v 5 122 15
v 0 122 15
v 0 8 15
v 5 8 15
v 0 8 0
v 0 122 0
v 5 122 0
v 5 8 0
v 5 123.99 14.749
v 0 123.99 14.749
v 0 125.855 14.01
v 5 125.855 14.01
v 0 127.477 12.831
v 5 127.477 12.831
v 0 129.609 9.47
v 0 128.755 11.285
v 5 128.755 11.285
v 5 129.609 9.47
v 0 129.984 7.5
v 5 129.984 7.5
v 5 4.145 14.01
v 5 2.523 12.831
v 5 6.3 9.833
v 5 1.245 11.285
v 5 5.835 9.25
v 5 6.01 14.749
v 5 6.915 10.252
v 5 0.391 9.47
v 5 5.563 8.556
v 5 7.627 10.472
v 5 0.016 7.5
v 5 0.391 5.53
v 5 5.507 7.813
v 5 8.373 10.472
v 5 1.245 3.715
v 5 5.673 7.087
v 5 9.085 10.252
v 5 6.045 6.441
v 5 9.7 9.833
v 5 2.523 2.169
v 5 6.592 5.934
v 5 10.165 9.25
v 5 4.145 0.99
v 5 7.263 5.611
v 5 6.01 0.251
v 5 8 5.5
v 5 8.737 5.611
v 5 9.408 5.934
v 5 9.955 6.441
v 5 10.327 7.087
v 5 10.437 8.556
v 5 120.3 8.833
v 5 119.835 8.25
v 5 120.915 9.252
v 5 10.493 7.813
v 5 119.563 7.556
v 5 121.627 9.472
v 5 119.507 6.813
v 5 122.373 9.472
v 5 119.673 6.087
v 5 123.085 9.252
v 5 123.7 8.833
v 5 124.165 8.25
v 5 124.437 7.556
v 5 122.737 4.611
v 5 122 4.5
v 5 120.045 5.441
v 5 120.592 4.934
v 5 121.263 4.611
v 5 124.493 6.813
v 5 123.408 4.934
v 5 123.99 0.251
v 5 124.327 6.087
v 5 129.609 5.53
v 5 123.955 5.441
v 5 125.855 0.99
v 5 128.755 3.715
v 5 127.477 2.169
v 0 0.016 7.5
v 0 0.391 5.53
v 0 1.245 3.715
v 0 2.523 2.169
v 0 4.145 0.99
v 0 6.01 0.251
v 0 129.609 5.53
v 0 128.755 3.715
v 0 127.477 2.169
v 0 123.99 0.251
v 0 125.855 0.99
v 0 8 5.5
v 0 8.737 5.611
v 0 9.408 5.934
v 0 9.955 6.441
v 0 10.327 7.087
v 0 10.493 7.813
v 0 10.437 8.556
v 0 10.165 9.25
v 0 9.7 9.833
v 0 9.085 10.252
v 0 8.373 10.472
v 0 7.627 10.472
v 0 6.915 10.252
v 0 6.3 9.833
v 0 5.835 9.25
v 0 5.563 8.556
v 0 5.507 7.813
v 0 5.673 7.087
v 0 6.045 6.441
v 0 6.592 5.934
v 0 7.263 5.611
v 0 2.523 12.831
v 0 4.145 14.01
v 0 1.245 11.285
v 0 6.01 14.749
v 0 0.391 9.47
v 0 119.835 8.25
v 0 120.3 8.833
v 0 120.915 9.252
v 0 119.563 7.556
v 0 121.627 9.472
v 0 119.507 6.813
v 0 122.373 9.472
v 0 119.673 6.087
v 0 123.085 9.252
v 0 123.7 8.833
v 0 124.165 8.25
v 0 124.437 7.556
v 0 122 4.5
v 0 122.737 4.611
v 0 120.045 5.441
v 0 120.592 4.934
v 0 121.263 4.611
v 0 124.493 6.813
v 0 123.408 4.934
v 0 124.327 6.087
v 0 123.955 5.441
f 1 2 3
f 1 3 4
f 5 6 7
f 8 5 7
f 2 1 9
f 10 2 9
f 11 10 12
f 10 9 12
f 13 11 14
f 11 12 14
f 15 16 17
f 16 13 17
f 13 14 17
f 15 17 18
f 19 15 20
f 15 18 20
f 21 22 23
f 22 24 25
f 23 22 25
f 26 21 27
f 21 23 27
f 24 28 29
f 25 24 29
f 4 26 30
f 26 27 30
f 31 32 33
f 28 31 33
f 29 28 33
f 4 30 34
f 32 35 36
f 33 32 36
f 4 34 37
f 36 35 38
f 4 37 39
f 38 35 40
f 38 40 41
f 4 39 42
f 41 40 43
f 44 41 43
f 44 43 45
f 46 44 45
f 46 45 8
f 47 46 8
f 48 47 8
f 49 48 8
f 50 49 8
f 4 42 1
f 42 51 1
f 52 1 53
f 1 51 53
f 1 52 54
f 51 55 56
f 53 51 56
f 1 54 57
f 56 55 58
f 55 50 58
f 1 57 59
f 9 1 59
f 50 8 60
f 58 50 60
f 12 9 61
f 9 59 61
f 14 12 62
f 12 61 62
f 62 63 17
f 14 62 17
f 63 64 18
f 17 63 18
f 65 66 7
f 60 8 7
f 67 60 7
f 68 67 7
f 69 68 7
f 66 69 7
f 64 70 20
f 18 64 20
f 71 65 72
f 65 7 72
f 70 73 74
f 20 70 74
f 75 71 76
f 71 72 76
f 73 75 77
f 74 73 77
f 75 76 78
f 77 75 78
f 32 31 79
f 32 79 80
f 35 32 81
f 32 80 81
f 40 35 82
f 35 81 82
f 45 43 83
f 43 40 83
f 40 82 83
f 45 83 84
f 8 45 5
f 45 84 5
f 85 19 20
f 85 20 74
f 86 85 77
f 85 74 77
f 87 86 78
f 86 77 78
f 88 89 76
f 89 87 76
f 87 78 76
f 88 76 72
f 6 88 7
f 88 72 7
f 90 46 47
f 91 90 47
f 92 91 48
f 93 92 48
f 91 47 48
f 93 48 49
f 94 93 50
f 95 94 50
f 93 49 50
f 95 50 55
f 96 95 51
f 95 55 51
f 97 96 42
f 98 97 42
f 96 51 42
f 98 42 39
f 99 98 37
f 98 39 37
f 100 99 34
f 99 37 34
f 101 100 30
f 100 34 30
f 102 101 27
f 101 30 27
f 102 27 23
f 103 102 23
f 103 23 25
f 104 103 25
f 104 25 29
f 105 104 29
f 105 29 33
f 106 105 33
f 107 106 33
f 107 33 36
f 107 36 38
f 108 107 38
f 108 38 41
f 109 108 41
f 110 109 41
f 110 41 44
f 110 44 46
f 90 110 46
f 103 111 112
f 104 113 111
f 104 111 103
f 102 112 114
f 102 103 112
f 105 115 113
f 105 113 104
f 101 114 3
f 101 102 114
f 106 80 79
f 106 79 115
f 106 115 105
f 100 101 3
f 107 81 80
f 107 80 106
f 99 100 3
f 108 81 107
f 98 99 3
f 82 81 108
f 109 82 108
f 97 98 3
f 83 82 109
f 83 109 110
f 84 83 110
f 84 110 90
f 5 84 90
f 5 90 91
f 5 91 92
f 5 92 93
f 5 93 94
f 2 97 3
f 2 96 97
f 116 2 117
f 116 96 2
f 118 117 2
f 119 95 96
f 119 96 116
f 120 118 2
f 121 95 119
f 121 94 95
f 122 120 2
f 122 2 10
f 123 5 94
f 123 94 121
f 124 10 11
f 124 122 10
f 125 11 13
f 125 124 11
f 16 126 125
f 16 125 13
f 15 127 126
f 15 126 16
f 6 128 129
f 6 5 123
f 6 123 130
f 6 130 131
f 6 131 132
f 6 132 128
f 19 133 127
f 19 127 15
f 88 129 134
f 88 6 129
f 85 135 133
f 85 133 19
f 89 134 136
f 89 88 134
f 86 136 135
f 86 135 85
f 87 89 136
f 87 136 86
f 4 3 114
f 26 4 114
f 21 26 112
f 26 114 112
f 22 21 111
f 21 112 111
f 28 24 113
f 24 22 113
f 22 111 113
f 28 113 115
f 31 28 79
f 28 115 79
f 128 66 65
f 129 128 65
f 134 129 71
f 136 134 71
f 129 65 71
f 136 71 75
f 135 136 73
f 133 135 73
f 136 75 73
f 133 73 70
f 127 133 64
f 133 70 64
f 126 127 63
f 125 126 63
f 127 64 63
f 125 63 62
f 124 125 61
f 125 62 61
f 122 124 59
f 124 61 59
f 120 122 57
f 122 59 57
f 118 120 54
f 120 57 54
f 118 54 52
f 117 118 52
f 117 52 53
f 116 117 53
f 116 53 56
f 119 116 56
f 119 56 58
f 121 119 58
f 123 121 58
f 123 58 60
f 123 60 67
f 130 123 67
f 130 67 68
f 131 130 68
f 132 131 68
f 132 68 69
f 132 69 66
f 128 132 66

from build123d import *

# Parameters (mm, degrees)
ESQUISSE1_W             = 5
ESQUISSE1_H             = 130
BOSS_EXTRU_1_DEPTH      = 15
CONG_1_R                = 8
ESQUISSE2_R             = 2.5
ENL_V_MAT_EXTRU_1_DEPTH = 15


with BuildPart() as part:
    # Esquisse1 → Boss.-Extru.1 (new body)
    with BuildSketch(Plane.XY):
        with Locations((2.5, 65)):
            Rectangle(ESQUISSE1_W, ESQUISSE1_H)
    extrude(amount=BOSS_EXTRU_1_DEPTH)

    # Congé1
    # the kernel refuses this fillet: 8 mm, written as the material it takes off along each edge
    with BuildSketch(Plane(origin=(-20, 0, 15), x_dir=(0, 0, -1), z_dir=(1, 0, 0)), Plane(origin=(25, 130, 15), x_dir=(0, 0, -1), z_dir=(-1, 0, 0))) as cong_1_piece_1:
        with BuildLine():
            CenterArc((CONG_1_R, CONG_1_R), CONG_1_R, 180, 90)
            Line((0, CONG_1_R), (0, 0))
            Line((0, 0), (CONG_1_R, 0))
        make_face()
    extrude(amount=45, mode=Mode.SUBTRACT)
    with BuildSketch(Plane(origin=(-20, 0, 0), x_dir=(0, 0, 1), z_dir=(1, 0, 0)), Plane(origin=(25, 130, 0), x_dir=(0, 0, 1), z_dir=(-1, 0, 0))) as cong_1_piece_2:
        with BuildLine():
            CenterArc((CONG_1_R, -CONG_1_R), CONG_1_R, 90, 90)
            Line((0, -CONG_1_R), (0, 0))
            Line((0, 0), (CONG_1_R, 0))
        make_face()
    extrude(amount=45, mode=Mode.SUBTRACT)

    # Esquisse2 → Enlèv. mat.-Extru.1 (cut)
    with BuildSketch(Plane(origin=(5, 0, 0), x_dir=(0, 0, -1), z_dir=(1, 0, 0))):
        with Locations((-7, 122)):
            Circle(ESQUISSE2_R)
        with Locations((-8, 8)):
            Circle(ESQUISSE2_R)
    extrude(amount=-ENL_V_MAT_EXTRU_1_DEPTH, mode=Mode.SUBTRACT)


solid = part.part
